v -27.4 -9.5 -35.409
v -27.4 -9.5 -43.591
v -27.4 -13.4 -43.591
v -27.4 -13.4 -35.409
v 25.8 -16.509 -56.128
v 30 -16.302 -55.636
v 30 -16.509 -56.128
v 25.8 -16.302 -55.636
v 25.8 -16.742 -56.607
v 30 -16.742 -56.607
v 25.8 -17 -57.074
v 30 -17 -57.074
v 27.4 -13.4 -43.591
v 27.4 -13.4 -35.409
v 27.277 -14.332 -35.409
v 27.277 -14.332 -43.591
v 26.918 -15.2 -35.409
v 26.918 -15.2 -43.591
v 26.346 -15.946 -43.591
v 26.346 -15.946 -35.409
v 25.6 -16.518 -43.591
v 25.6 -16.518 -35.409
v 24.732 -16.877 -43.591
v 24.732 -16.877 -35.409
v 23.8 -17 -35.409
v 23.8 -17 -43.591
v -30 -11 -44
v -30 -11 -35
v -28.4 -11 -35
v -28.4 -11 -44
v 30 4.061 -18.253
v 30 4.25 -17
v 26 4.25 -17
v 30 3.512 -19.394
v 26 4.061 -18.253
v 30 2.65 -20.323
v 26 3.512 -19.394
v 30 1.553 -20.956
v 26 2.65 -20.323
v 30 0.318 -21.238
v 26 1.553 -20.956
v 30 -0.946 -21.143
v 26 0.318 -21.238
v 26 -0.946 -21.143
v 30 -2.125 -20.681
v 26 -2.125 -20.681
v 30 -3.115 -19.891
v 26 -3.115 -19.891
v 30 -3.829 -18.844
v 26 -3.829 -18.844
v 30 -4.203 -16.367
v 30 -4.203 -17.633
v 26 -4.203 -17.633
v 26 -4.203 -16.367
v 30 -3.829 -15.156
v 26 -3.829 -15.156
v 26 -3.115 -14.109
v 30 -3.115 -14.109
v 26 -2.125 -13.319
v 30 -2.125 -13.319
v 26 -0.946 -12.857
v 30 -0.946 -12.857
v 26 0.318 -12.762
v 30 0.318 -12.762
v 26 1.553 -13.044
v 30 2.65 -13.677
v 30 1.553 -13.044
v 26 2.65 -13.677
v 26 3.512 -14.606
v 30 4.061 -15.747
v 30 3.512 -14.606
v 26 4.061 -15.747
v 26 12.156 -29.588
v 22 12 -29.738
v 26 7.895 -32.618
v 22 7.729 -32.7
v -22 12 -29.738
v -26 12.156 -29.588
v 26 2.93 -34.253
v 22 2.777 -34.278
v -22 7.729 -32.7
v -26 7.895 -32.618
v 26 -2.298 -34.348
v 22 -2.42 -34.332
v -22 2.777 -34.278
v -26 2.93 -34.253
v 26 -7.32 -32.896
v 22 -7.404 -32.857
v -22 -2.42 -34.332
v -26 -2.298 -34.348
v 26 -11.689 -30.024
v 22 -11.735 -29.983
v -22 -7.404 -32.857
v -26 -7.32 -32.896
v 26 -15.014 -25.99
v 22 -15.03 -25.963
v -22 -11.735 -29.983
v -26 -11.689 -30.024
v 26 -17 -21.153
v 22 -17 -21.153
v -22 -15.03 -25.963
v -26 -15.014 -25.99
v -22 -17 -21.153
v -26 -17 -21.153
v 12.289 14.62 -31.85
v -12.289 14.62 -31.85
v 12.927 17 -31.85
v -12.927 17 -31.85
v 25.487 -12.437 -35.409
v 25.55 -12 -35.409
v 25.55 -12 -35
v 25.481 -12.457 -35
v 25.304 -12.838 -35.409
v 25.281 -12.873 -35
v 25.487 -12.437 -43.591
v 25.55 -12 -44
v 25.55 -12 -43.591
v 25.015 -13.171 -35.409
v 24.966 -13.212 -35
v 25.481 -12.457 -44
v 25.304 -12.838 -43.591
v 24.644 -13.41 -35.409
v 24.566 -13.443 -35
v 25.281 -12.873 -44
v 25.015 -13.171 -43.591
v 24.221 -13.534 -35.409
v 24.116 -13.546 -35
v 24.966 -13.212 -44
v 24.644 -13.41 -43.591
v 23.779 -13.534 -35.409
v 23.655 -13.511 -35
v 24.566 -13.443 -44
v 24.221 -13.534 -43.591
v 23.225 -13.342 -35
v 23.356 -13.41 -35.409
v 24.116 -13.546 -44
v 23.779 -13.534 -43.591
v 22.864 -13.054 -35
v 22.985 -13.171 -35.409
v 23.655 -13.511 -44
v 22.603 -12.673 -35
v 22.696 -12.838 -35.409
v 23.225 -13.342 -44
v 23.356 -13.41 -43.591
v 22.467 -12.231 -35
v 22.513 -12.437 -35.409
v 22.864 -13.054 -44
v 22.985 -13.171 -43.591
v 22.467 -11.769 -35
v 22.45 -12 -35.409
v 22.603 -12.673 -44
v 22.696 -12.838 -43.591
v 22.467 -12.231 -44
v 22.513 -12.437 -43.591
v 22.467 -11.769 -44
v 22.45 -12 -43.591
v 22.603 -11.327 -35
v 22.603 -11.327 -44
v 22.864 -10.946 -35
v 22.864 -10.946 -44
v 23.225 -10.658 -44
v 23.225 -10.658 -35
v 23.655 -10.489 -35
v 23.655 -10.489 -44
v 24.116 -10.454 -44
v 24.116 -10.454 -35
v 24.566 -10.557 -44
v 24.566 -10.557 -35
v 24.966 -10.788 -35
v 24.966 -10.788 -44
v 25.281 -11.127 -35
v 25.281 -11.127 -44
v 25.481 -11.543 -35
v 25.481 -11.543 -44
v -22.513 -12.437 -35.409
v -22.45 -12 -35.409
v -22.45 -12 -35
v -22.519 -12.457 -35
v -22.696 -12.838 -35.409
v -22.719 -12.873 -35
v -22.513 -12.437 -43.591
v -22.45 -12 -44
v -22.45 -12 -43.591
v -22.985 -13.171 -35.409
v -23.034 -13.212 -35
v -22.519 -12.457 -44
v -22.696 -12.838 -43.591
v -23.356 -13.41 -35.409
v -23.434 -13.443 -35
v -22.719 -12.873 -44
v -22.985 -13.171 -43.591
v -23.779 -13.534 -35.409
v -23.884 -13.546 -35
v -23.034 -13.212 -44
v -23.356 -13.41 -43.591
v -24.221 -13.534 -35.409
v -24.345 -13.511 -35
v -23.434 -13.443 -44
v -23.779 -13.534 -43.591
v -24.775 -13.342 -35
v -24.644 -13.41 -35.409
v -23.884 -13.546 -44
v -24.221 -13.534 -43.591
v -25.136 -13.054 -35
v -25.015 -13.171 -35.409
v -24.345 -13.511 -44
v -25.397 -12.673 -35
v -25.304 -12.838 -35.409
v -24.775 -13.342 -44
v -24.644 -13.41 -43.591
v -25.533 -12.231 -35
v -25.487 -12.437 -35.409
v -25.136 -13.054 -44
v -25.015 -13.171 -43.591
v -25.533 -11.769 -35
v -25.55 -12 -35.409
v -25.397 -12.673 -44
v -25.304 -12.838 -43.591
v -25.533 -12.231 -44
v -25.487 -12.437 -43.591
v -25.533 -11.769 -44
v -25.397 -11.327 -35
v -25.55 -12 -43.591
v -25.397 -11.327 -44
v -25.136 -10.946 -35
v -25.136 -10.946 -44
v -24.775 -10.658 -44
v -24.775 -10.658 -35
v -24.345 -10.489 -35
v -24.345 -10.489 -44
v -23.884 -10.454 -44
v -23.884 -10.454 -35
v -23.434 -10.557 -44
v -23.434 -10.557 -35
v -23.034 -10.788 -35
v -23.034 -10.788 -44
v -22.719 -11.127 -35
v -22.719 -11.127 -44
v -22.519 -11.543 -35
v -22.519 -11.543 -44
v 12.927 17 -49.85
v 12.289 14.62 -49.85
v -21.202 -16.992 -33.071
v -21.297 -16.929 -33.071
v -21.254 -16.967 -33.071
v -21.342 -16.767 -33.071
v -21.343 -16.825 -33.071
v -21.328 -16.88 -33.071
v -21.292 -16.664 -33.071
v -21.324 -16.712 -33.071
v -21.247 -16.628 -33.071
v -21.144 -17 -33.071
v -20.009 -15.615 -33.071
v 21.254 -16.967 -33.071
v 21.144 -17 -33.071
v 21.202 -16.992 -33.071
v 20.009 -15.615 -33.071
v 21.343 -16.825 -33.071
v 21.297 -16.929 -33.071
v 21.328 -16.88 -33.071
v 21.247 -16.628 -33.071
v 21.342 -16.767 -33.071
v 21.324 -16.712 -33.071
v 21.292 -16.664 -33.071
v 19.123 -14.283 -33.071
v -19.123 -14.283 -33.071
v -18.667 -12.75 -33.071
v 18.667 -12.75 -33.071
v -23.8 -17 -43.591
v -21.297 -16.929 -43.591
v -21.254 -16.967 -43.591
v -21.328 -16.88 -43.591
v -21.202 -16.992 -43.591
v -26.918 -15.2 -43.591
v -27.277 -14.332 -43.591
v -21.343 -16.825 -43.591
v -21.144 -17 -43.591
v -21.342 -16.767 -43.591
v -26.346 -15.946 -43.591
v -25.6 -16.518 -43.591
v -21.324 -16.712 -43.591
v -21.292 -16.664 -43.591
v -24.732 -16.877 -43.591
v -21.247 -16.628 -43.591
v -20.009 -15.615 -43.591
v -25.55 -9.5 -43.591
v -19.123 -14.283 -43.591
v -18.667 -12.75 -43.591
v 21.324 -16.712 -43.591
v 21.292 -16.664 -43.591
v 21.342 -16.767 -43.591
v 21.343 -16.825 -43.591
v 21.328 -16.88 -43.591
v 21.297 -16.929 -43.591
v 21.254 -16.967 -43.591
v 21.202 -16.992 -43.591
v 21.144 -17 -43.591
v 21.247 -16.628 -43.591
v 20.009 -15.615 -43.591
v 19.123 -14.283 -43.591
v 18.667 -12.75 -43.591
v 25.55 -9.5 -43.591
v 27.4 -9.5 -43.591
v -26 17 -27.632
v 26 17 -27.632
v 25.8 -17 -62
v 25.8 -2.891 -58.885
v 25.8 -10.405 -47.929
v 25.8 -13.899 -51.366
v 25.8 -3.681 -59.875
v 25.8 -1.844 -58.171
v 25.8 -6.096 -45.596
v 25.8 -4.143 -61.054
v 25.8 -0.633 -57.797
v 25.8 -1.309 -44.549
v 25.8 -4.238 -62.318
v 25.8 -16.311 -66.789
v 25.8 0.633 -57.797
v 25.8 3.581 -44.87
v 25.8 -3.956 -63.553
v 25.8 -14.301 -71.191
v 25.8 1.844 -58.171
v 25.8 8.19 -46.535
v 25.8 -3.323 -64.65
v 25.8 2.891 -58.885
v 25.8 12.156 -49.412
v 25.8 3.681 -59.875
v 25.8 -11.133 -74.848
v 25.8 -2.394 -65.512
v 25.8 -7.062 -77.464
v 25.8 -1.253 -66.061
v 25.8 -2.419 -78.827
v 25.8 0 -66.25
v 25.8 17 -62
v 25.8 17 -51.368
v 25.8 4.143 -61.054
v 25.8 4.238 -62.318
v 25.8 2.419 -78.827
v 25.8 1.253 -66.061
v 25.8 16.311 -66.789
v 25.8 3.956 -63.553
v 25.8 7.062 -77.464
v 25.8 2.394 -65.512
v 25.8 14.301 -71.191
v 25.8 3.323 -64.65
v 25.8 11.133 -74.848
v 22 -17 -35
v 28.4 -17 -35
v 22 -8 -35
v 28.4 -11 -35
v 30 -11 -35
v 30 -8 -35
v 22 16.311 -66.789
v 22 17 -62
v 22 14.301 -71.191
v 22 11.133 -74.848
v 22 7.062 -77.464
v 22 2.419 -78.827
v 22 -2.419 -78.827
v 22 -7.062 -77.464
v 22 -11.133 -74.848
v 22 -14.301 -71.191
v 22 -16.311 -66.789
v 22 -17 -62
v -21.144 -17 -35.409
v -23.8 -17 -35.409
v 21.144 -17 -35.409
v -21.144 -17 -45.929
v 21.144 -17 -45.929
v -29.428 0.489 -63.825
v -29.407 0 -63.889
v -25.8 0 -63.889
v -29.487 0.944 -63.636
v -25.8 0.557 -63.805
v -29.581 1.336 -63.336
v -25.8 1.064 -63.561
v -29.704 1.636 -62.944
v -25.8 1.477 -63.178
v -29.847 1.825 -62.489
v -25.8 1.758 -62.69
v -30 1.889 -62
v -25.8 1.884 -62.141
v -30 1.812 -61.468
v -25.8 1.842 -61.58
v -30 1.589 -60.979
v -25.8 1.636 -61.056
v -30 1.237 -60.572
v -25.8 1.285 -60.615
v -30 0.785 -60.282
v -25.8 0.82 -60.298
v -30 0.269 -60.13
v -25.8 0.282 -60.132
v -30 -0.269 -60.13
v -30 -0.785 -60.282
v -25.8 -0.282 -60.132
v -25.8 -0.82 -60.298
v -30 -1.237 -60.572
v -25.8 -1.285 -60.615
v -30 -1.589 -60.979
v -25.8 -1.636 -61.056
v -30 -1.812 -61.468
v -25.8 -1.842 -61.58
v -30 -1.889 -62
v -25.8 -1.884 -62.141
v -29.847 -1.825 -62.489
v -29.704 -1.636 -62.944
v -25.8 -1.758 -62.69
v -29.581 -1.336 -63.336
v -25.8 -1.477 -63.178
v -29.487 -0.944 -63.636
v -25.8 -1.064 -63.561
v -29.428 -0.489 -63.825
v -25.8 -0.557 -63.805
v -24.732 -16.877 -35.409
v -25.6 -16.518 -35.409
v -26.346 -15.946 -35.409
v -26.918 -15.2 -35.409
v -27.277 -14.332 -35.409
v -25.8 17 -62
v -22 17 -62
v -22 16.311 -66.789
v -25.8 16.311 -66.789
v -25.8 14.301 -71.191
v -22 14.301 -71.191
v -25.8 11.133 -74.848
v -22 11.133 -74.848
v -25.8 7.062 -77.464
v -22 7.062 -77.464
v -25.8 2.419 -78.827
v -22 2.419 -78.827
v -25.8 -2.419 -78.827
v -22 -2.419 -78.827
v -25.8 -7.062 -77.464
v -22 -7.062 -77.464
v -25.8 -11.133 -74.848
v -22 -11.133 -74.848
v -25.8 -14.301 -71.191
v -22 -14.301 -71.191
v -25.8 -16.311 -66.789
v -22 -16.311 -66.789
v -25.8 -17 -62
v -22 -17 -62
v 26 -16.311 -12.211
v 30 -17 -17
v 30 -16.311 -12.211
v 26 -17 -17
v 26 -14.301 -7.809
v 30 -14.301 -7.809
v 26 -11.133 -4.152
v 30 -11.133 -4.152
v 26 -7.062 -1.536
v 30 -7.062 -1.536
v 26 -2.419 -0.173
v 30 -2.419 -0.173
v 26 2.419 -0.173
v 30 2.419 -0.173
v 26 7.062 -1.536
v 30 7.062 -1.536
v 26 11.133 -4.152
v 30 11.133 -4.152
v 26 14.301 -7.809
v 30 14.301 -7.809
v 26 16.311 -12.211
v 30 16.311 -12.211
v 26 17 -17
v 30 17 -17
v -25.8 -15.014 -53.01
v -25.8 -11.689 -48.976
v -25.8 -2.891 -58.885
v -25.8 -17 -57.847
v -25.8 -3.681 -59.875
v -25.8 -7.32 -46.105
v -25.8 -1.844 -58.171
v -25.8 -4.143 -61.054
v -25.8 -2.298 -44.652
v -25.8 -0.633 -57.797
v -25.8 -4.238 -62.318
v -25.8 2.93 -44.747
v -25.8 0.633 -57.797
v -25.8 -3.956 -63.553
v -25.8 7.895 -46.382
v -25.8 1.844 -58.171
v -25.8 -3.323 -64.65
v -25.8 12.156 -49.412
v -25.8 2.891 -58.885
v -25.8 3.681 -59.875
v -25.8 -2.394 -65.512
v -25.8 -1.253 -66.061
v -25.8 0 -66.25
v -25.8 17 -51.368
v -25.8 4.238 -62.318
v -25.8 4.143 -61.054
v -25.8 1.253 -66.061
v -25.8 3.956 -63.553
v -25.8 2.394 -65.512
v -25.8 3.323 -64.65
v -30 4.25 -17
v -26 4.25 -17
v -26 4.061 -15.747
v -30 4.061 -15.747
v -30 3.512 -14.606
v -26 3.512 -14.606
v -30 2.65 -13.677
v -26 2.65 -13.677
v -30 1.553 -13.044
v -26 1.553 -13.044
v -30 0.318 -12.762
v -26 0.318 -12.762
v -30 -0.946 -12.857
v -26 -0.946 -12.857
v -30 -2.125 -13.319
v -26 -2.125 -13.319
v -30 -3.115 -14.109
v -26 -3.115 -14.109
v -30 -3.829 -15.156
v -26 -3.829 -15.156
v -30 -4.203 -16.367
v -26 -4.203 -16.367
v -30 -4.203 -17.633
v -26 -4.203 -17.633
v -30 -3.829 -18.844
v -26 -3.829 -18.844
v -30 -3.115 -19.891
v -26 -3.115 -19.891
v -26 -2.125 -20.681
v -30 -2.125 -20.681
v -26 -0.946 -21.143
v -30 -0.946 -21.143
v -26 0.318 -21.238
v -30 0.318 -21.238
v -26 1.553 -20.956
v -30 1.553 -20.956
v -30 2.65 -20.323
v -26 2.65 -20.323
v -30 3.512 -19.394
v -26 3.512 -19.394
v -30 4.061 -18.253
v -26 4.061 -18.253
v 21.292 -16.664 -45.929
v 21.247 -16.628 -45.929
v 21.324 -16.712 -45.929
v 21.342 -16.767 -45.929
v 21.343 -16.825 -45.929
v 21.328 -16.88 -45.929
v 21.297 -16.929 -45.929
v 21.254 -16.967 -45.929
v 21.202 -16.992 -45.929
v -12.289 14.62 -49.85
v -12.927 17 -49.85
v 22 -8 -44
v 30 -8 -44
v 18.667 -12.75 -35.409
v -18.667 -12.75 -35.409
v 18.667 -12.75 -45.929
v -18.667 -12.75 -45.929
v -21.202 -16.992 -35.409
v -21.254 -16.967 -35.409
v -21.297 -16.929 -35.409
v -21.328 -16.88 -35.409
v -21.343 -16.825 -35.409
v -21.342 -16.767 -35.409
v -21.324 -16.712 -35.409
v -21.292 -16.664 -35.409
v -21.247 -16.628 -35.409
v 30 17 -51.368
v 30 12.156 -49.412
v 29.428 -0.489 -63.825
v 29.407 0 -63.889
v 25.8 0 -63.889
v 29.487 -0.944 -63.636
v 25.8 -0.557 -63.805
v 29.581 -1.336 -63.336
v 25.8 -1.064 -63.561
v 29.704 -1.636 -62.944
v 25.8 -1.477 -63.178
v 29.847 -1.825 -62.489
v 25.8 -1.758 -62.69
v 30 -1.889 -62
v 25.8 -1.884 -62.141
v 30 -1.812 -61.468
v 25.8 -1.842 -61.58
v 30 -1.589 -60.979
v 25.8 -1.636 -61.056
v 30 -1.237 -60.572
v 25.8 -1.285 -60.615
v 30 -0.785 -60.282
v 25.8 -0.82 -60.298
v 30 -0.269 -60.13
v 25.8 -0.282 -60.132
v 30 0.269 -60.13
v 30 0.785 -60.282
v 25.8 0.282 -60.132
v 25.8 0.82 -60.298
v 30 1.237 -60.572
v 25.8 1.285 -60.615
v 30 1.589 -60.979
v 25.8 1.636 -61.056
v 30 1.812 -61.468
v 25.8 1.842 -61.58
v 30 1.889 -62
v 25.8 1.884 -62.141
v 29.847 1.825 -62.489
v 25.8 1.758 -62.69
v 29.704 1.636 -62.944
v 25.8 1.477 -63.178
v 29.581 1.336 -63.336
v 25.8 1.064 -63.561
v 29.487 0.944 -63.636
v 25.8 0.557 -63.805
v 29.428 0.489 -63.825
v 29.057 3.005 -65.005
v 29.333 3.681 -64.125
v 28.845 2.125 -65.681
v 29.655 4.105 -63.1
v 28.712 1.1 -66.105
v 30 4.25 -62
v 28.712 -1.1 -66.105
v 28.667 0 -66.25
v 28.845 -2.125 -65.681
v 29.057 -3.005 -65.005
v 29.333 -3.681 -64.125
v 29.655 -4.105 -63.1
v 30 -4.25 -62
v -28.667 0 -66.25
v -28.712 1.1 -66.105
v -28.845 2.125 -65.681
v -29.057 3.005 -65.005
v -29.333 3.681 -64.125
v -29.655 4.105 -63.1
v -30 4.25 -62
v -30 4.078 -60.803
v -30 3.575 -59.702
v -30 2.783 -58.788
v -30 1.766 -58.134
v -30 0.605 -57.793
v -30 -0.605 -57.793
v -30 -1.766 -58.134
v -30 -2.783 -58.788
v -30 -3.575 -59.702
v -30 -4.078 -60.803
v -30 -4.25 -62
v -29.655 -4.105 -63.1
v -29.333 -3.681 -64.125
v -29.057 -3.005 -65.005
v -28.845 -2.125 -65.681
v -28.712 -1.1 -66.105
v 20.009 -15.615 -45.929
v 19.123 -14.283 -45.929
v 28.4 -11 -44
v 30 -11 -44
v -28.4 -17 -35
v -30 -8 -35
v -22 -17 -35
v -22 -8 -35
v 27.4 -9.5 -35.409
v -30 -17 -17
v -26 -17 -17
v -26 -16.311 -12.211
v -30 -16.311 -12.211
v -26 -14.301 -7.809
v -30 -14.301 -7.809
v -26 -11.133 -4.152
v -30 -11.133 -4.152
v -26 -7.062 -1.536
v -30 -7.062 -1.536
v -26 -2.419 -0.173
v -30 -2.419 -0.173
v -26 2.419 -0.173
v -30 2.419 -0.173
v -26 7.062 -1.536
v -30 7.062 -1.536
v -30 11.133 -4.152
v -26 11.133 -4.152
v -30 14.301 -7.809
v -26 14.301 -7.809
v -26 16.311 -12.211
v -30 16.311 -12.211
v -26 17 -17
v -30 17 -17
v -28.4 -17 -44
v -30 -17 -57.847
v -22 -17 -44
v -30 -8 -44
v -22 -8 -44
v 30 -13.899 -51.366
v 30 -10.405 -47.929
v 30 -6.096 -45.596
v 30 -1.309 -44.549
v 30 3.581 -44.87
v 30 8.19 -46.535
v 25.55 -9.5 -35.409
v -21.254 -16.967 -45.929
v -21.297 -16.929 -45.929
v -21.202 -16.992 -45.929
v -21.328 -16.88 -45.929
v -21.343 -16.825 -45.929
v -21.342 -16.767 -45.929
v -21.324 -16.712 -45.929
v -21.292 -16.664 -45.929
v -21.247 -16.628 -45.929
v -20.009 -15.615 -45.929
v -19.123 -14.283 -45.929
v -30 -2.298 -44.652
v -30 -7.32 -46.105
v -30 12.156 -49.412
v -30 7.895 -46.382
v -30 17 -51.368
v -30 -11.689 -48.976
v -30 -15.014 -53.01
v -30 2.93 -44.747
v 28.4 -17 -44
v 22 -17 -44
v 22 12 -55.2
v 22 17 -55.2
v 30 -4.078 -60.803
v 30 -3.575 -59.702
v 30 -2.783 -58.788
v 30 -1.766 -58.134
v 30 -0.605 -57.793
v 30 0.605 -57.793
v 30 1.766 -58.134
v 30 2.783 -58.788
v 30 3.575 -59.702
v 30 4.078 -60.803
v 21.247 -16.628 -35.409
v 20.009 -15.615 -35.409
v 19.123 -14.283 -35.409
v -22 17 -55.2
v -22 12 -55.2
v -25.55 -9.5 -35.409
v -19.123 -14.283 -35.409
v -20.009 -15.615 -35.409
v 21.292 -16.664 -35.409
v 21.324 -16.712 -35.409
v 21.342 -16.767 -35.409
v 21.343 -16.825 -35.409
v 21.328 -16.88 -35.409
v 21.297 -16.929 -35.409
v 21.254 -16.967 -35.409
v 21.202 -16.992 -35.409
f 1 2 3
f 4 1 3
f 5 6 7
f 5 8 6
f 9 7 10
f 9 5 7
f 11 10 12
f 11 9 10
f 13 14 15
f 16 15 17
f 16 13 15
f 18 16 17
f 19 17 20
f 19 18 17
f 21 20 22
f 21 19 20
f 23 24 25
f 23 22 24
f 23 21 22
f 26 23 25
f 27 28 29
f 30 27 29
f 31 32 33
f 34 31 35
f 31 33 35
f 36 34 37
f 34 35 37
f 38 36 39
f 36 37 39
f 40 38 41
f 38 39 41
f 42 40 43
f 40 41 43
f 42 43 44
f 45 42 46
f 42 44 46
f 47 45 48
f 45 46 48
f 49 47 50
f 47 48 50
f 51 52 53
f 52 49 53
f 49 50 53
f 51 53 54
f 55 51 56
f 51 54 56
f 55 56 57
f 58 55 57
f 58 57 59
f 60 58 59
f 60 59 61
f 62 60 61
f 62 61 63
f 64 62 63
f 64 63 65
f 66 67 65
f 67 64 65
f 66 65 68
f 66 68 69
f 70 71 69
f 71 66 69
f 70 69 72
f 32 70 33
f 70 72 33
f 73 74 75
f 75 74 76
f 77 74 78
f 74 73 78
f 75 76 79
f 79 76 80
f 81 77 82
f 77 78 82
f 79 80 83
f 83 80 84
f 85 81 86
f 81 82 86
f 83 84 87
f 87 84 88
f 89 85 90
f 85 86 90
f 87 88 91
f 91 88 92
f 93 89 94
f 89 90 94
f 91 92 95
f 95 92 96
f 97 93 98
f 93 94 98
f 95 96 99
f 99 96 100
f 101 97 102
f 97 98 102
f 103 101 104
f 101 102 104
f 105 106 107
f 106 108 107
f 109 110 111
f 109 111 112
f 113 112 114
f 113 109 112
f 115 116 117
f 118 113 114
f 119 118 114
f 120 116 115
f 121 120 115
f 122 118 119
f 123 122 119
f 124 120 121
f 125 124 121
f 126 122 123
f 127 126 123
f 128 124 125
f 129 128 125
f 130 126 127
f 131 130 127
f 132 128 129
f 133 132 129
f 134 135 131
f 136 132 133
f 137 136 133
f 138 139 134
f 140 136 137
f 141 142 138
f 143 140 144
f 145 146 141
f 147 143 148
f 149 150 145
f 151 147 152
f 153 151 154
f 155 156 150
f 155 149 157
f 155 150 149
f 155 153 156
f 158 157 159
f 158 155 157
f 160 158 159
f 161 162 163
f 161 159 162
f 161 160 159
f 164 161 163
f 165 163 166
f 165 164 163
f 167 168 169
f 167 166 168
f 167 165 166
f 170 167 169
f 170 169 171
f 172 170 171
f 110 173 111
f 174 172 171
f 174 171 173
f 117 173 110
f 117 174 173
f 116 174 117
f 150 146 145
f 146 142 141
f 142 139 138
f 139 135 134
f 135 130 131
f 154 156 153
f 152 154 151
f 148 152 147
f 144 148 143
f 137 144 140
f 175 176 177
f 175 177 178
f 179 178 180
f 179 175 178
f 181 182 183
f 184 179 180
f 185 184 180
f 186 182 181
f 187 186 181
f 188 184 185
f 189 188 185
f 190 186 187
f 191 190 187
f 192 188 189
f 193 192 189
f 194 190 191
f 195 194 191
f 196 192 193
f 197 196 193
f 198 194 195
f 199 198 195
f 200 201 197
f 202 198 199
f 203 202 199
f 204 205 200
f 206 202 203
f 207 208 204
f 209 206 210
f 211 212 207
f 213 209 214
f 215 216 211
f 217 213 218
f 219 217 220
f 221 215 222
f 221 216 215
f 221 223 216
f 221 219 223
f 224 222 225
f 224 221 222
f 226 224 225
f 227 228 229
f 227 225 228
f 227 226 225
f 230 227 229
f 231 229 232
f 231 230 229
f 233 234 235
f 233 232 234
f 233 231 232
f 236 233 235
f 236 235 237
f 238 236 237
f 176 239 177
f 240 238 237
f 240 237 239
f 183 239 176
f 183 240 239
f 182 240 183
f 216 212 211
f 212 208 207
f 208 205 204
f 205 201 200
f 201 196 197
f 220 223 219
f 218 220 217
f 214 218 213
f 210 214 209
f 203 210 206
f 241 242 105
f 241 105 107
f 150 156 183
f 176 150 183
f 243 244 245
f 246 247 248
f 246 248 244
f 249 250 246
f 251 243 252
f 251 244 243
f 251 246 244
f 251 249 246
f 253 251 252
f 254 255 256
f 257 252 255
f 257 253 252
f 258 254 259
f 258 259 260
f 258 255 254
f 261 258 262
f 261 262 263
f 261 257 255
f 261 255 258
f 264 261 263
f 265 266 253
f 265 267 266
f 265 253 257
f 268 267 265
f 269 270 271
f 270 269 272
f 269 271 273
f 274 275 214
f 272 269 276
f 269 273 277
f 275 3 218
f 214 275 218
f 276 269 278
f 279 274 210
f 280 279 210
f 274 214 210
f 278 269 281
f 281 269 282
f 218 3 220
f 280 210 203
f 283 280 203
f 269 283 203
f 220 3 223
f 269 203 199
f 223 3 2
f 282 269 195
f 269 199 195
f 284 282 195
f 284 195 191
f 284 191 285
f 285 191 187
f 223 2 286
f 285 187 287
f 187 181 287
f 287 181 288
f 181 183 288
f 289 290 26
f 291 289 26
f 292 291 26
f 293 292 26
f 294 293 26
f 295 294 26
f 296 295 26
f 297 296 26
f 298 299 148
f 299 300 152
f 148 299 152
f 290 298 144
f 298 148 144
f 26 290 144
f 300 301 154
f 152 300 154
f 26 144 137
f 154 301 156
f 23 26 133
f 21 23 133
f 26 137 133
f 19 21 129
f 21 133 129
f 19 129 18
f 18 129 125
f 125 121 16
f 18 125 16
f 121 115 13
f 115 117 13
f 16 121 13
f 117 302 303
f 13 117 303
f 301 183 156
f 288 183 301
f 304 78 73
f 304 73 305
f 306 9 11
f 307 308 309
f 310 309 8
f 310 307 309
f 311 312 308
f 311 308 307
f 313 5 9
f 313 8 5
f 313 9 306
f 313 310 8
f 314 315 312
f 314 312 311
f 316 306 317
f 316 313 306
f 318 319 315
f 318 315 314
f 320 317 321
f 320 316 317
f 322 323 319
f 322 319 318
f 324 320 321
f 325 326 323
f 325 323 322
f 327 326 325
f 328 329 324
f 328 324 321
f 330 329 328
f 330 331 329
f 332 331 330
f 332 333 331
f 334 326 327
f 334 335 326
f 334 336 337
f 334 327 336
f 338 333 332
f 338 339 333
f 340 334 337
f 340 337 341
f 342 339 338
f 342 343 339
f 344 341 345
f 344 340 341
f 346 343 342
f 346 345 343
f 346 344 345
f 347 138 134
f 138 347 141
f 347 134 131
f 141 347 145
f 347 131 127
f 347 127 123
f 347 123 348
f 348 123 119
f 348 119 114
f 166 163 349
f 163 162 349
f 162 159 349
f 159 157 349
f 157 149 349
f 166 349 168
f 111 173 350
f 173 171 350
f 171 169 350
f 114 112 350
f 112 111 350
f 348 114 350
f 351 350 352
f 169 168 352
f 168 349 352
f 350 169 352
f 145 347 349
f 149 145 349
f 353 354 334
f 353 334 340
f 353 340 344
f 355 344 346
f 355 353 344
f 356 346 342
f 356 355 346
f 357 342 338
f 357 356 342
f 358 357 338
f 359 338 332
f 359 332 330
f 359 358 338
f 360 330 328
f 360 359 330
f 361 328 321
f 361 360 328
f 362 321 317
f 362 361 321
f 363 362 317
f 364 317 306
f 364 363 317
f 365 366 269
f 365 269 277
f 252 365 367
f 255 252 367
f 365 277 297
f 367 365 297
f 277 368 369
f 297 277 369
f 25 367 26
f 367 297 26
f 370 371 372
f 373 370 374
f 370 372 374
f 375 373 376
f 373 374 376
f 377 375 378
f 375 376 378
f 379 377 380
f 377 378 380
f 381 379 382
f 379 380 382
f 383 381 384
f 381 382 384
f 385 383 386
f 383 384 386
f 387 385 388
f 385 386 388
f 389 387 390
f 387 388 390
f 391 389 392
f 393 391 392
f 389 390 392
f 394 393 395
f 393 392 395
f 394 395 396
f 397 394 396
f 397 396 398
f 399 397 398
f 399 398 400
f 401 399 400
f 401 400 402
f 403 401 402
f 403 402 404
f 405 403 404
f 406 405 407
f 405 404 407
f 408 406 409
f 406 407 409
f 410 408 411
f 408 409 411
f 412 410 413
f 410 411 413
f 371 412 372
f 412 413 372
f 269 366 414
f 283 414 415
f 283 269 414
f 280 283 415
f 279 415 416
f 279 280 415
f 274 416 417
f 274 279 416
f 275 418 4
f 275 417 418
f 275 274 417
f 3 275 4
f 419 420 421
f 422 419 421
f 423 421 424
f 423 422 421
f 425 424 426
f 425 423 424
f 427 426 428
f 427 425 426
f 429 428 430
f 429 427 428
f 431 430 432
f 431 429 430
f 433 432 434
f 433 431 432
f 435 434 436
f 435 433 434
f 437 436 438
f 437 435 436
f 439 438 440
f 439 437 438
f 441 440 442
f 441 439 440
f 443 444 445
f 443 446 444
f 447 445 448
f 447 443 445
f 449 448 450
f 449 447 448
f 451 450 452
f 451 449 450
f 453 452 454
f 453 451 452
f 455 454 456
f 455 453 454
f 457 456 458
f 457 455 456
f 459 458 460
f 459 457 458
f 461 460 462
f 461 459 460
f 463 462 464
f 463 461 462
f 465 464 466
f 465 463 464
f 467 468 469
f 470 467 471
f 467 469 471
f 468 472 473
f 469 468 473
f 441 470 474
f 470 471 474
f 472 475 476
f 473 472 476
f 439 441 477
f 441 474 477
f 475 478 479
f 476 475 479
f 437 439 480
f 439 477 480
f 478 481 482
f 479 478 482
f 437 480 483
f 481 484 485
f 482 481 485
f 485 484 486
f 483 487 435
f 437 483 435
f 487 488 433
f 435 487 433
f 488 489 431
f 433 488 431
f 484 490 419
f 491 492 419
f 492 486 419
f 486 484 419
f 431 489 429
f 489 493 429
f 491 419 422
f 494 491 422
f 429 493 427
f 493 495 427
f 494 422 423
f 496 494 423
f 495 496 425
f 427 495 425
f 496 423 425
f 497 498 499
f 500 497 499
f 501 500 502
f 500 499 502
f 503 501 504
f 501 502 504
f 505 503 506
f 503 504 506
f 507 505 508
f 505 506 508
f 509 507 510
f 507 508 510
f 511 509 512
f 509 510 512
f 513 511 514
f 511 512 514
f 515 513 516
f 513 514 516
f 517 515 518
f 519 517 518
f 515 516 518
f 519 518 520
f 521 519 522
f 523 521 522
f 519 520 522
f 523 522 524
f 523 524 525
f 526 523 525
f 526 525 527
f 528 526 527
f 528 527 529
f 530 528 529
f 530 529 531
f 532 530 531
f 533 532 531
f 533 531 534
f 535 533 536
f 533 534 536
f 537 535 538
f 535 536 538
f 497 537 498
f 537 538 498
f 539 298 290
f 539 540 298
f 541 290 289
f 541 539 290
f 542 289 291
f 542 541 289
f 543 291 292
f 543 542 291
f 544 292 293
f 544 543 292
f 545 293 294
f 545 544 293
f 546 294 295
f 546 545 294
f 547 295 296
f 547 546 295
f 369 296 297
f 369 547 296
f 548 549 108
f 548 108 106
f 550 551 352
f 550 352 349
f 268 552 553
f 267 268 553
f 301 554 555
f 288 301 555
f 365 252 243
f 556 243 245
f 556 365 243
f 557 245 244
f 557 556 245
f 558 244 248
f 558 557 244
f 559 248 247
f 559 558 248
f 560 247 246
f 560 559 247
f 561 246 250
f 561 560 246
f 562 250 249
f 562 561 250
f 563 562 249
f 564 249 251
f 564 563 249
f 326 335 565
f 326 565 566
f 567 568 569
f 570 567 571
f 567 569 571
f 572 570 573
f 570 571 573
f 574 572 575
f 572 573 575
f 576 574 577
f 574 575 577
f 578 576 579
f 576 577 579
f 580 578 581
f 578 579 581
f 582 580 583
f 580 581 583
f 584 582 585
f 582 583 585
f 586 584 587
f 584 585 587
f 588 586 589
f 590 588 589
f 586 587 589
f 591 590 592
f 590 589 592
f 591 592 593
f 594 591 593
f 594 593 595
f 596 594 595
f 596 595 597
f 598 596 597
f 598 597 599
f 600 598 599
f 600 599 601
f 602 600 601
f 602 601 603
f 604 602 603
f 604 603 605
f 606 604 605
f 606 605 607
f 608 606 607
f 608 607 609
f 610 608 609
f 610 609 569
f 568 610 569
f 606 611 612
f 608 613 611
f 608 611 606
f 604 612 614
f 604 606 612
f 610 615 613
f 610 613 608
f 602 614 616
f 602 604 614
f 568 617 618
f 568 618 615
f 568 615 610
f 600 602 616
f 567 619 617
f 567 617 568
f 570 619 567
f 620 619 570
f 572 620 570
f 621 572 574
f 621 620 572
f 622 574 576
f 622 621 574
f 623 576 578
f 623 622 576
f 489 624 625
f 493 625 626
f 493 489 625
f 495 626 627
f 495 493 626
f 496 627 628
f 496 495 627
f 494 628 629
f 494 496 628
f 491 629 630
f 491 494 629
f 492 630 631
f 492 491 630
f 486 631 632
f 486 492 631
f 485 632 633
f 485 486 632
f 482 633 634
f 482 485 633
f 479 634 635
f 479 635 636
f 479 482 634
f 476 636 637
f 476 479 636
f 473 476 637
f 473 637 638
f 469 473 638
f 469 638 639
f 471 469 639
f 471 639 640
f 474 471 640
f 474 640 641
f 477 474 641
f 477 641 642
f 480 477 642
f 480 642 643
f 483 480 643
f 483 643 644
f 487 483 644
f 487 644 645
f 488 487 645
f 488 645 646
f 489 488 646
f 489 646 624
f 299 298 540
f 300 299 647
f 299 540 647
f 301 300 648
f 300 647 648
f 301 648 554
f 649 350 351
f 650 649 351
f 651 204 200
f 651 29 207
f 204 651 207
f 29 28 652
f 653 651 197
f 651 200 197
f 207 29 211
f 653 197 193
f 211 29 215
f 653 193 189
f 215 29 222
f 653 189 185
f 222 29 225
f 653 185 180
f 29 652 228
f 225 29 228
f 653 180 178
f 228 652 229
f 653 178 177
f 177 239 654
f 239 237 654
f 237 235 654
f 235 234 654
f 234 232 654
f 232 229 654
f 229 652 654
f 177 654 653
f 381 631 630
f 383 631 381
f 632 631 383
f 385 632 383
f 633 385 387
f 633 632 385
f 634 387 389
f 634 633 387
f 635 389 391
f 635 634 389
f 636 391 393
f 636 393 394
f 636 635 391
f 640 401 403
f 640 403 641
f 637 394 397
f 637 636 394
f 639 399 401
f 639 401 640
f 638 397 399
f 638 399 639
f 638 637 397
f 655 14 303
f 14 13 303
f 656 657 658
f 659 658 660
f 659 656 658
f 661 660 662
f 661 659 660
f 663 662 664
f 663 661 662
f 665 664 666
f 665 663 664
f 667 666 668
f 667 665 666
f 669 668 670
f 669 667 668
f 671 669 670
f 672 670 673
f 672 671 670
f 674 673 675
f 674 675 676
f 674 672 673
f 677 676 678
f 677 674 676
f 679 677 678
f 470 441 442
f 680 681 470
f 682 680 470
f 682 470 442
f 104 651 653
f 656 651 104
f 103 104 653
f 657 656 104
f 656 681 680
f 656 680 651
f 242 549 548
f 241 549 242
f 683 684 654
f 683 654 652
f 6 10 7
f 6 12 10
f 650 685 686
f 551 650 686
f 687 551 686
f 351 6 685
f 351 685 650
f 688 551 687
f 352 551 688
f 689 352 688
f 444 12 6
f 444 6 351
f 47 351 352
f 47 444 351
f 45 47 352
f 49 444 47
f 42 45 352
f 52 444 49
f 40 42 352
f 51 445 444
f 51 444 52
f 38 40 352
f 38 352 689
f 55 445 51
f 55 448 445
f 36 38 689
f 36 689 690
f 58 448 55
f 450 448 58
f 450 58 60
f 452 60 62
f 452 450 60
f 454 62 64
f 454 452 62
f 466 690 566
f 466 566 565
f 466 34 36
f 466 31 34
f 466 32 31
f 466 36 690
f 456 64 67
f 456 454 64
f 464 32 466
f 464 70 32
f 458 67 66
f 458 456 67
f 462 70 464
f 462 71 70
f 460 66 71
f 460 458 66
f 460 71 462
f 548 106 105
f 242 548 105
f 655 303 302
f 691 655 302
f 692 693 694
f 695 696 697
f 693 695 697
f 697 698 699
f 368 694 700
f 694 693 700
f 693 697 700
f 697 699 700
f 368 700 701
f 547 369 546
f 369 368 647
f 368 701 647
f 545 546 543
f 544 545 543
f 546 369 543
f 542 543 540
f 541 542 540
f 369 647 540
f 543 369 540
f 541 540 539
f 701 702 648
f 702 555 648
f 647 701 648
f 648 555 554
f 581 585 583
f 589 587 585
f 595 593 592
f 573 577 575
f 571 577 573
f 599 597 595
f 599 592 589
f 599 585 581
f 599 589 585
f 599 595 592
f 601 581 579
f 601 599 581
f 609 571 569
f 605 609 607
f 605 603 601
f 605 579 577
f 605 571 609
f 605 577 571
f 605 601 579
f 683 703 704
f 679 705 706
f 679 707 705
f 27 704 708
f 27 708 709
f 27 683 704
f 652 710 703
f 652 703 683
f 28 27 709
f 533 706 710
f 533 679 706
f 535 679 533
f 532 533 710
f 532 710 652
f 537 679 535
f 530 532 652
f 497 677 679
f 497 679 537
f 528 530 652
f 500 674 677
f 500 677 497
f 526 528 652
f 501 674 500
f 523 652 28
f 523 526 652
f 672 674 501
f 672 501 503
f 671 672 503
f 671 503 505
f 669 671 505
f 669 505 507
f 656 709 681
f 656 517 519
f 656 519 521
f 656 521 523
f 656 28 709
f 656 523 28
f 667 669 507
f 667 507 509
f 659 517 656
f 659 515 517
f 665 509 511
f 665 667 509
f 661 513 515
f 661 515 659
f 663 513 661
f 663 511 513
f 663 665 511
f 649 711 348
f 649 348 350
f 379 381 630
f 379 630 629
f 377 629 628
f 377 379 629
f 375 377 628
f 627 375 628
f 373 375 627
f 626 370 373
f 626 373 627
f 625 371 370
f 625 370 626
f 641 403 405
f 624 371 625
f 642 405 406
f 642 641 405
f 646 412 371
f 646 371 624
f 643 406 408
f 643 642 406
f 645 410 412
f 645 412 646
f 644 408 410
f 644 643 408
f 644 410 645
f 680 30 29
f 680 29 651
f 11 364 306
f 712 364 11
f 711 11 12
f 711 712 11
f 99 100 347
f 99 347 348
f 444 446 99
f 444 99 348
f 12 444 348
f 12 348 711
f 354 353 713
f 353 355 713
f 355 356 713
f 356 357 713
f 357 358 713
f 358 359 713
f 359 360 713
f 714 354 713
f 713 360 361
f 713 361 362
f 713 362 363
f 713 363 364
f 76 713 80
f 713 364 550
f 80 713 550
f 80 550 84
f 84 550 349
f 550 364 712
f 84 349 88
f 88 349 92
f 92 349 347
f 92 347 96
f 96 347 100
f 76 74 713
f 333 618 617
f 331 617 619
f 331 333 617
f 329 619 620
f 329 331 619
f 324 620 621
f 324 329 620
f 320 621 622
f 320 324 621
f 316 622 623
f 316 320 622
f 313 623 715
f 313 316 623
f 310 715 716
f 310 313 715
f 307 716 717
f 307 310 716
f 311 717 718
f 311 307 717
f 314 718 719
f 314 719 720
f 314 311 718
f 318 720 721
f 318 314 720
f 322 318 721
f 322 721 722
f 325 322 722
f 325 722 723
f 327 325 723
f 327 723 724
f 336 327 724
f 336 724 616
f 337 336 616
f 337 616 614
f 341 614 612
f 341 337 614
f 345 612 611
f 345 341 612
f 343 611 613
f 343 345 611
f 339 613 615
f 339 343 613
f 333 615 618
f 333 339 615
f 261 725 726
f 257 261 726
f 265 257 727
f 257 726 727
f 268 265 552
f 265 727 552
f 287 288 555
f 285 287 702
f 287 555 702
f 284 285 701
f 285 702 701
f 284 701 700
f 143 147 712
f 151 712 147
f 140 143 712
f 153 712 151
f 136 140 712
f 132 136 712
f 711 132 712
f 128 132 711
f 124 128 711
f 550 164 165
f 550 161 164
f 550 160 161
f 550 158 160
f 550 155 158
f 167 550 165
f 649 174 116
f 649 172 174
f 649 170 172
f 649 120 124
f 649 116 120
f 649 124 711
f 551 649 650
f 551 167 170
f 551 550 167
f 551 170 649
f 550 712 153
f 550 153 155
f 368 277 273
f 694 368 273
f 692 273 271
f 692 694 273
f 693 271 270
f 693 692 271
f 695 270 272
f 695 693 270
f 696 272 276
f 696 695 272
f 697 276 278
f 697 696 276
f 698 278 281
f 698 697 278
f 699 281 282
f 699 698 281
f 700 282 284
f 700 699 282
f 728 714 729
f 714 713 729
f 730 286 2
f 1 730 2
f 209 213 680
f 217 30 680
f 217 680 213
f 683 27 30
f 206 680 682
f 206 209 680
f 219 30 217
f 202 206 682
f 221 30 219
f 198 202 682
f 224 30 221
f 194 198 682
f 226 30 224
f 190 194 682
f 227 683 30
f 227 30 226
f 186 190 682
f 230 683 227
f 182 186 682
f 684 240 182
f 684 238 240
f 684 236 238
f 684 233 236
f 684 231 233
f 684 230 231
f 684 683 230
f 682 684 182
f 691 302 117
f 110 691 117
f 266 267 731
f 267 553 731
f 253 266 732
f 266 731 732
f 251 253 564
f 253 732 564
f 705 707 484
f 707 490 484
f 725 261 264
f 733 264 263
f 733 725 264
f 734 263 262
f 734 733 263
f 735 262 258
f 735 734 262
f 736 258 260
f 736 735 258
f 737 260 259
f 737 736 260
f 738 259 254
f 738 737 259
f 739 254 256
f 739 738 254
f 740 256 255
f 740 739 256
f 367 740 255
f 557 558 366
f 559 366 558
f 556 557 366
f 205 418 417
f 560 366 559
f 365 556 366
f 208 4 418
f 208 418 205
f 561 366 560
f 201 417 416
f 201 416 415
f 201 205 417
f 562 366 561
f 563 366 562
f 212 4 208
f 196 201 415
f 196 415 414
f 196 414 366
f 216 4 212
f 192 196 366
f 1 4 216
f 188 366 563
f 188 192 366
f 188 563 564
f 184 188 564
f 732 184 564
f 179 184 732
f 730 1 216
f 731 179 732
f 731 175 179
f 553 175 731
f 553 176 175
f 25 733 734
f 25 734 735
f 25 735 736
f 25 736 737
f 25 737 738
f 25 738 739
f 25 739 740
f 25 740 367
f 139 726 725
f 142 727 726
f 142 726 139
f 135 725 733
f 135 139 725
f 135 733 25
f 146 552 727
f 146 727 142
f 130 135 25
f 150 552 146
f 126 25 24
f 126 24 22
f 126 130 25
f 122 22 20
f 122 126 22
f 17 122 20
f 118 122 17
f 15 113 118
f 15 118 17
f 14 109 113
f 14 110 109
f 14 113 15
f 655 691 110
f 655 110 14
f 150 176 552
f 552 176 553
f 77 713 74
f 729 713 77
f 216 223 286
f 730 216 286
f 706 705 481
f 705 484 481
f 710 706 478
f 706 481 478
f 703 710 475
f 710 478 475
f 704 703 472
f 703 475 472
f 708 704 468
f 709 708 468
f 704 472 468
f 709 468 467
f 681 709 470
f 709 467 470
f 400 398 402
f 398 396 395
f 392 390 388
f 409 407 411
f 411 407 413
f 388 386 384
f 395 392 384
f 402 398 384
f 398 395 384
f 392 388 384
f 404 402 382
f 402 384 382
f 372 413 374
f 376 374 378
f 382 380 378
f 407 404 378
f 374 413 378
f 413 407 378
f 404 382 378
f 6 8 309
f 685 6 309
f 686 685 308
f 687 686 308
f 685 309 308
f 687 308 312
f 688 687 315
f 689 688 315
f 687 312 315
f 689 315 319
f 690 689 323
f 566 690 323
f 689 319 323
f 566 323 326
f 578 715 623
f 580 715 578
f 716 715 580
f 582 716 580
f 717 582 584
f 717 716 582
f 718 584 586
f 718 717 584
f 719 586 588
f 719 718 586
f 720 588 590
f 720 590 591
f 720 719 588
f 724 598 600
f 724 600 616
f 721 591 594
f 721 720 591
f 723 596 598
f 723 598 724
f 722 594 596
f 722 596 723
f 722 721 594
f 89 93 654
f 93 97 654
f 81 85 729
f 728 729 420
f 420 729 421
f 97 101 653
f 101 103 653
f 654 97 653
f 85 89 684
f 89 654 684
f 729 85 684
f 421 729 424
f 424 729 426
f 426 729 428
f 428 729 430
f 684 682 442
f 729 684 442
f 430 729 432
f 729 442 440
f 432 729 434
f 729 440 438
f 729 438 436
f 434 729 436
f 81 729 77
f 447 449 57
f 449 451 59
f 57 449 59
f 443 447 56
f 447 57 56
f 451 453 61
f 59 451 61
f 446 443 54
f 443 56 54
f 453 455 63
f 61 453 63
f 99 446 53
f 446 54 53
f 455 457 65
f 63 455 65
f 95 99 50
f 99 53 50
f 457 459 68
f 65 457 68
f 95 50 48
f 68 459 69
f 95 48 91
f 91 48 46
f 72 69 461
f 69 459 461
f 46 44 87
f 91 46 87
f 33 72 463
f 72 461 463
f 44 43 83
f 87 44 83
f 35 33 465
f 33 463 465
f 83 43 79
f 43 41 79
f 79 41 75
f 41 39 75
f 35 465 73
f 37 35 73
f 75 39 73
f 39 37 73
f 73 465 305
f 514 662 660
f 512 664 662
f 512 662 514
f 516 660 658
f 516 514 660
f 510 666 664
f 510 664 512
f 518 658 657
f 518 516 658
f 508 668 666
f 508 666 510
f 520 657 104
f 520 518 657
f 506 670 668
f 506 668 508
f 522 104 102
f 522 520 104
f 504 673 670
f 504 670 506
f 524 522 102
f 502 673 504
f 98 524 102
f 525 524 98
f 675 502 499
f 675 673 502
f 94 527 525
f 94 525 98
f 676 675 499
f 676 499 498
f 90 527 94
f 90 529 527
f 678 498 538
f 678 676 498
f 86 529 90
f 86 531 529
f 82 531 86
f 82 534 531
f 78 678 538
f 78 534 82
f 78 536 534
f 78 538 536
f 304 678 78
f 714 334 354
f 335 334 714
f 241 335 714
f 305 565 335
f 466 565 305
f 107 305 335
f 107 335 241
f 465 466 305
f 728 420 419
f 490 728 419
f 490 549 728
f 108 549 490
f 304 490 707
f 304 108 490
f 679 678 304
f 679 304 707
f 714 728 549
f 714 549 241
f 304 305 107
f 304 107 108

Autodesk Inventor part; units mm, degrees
sketch "Sketch_1" plane through (0, 0, 0) normal (0, 0, 1) x (1, 0, 0)
  line L0 (-30, 17) -> (-30, -17)
  line L1 (-30, -17) -> (30, -17)
  line L2 (30, -17) -> (30, 17)
  line L3 (30, 17) -> (-30, 17)
extrude "Extrusion1" add sketch "Sketch_1" against normal blind 79
sketch "Sketch_3" plane through (0, 0, 0) normal (0, 0, 1) x (1, 0, 0)
  line L0 (-22, 12) -> (-22, -17)
  line L1 (-22, -17) -> (22, -17)
  line L2 (22, -17) -> (22, 12)
  line L3 (22, 12) -> (-22, 12)
extrude "Extrusion2" cut sketch "Sketch_3" along normal mid plane 158
sketch "Sketch_6" plane through (0, 0, -31.85) normal (0, 0, 1) x (1, 0, 0)
  line L0 (-13.2, 18.02) -> (-12.289, 14.62)
  line L1 (-12.289, 14.62) -> (12.289, 14.62)
  line L2 (12.289, 14.62) -> (13.2, 18.02)
  line L3 (13.2, 18.02) -> (-13.2, 18.02)
extrude "Extrusion3" cut sketch "Sketch_6" against normal blind 18
sketch "Sketch_4" plane through (0, 0, 0) normal (0, 1, 0) x (-1, 0, 0)
  line L0 (60, 60) -> (-60, 60)
  line L1 (-60, 60) -> (-60, -120)
  line L2 (-60, -120) -> (60, -120)
  line L3 (60, -120) -> (60, 60)
  line L4 (30, 0) -> (22, 0)
  line L5 (22, 0) -> (22, -27.2)
  line L6 (22, -27.2) -> (-22, -27.2)
  line L7 (-22, -27.2) -> (-22, 0)
  line L8 (-22, 0) -> (-30, 0)
  line L9 (-30, 0) -> (-30, -79)
  line L10 (-30, -79) -> (-22, -79)
  line L11 (-22, -79) -> (-22, -55.2)
  line L12 (-22, -55.2) -> (22, -55.2)
  line L13 (22, -55.2) -> (22, -79)
  line L14 (22, -79) -> (30, -79)
  line L15 (30, -79) -> (30, 0)
extrude "Extrusion4" cut sketch "Sketch_4" along normal mid plane 158
sketch "Sketch_2" plane through (0, 0, 0) normal (1, 0, 0) x (0, 1, 0)
  line L0 (45, 45) -> (-45, 45)
  line L1 (-45, 45) -> (-45, -90)
  line L2 (-45, -90) -> (45, -90)
  line L3 (45, -90) -> (45, 45)
  arc A0 (17, -17) -> (-17, -17) centre (0, -17) ccw
  line L4 (-17, -17) -> (-17, -62)
  arc A1 (-17, -62) -> (17, -62) centre (0, -62) ccw
  line L5 (17, -62) -> (17, -17)
extrude "Extrusion5" cut sketch "Sketch_2" along normal mid plane 60
sketch "Sketch_5" plane through (-25.8, 0, 0) normal (1, 0, 0) x (0, 0, -1)
  arc A0 (49.4116, 12.1565) -> (62, -17.5) centre (62, 0) ccw
  line L0 (62, -17.5) -> (62, -56)
  line L1 (62, -56) -> (89.4, -56)
  line L2 (89.4, -56) -> (89.4, 47)
  line L3 (89.4, 47) -> (63.4892, 47)
  line L4 (63.4892, 47) -> (49.4116, 12.1565)
  circle A1 centre (62, 0) radius 4.25
extrude "Extrusion6" cut sketch "Sketch_5" against normal blind 15
sketch "Sketch_8" plane through (-25.8, 0, 0) normal (1, 0, 0) x (0, 0, -1)
  circle A0 centre (62, 0) radius 1.8889
extrude "Extrusion7" cut sketch "Sketch_8" against normal blind 15
sketch "Sketch_11" plane through (0, 0, 0) normal (1, 0, 0) x (0, 1, 0)
  circle A0 centre (0, -17) radius 4.25
extrude "Extrusion8" cut sketch "Sketch_11" along normal mid plane 60
sketch "Sketch_24" plane through (-26, 0, 0) normal (1, 0, 0) x (0, 0, -1)
  line L0 (-3.4, -51) -> (17, -51)
  line L1 (17, -51) -> (17, -17.5)
  arc A0 (17, -17.5) -> (29.5884, 12.1565) centre (17, 0) ccw
  line L2 (29.5884, 12.1565) -> (21.5712, 32)
  line L3 (21.5712, 32) -> (-3.4, 32)
  line L4 (-3.4, 32) -> (-3.4, -51)
extrude "Extrusion9" cut sketch "Sketch_24" along normal blind 52
sketch "Sketch_7" plane through (25.8, 0, 0) normal (1, 0, 0) x (0, 0, -1)
  arc A0 (49.4116, 12.1565) -> (55.6364, -16.302) centre (62, 0) ccw
  arc A1 (62, -25.6174) -> (55.6364, -16.302) centre (52, -25.6174) ccw
  line L0 (62, -25.6174) -> (62, -56)
  line L1 (62, -56) -> (89.4, -56)
  line L2 (89.4, -56) -> (89.4, 47)
  line L3 (89.4, 47) -> (63.4892, 47)
  line L4 (63.4892, 47) -> (49.4116, 12.1565)
  circle A2 centre (62, 0) radius 4.25
extrude "Extrusion10" cut sketch "Sketch_7" along normal blind 15
sketch "Sketch_9" plane through (25.8, 0, 0) normal (1, 0, 0) x (0, 0, -1)
  circle A0 centre (62, 0) radius 1.8889
extrude "Extrusion11" cut sketch "Sketch_9" along normal blind 15
sketch "Sketch_10" plane through (0, 0, -39.5) normal (0, 0, 1) x (1, 0, 0)
  line L0 (-30, -8) -> (-30, -11)
  line L1 (-30, -11) -> (-28.4, -11)
  line L2 (-28.4, -11) -> (-28.4, -17)
  line L3 (-28.4, -17) -> (-22, -17)
  line L4 (-22, -17) -> (-22, -8)
  line L5 (-22, -8) -> (-30, -8)
  circle A0 centre (-24, -12) radius 1.55
extrude "Extrusion12" cut sketch "Sketch_10" along normal mid plane 9
sketch "Sketch_13" plane through (0, 0, -39.5) normal (0, 0, 1) x (1, 0, 0)
  line L0 (22, -8) -> (22, -17)
  line L1 (22, -17) -> (28.4, -17)
  line L2 (28.4, -17) -> (28.4, -11)
  line L3 (28.4, -11) -> (30, -11)
  line L4 (30, -11) -> (30, -8)
  line L5 (30, -8) -> (22, -8)
  circle A0 centre (24, -12) radius 1.55
extrude "Extrusion13" cut sketch "Sketch_13" along normal mid plane 9
sketch "Sketch_14" plane through (0, 0, 0) normal (0, 1, 0) x (-1, 0, 0)
  line L0 (-28.6667, -66.25) -> (-30, -62)
  line L1 (-30, -62) -> (-30, -66.25)
  line L2 (-30, -66.25) -> (-28.6667, -66.25)
extrude "Extrusion14" cut sketch "Sketch_14" along normal mid plane 8.5
sketch "Sketch_18" plane through (0, 0, 0) normal (0, 1, 0) x (-1, 0, 0)
  line L0 (30, -62) -> (28.6667, -66.25)
  line L1 (28.6667, -66.25) -> (30, -66.25)
  line L2 (30, -66.25) -> (30, -62)
extrude "Extrusion15" cut sketch "Sketch_18" along normal mid plane 8.5
sketch "Sketch_25" plane through (0, 0, -39.5) normal (0, 0, 1) x (1, 0, 0)
  line L0 (-27.4, -9.5) -> (-27.4, -13.4)
  arc A0 (-27.4, -13.4) -> (-23.8, -17) centre (-23.8, -13.4) ccw
  line L1 (-23.8, -17) -> (23.8, -17)
  arc A1 (23.8, -17) -> (27.4, -13.4) centre (23.8, -13.4) ccw
  line L2 (27.4, -13.4) -> (27.4, -9.5)
  line L3 (27.4, -9.5) -> (25.55, -9.5)
  line L4 (25.55, -9.5) -> (25.55, -12)
  arc A2 (22.45, -12) -> (25.55, -12) centre (24, -12) ccw
  line L5 (22.45, -12) -> (-22.45, -12)
  arc A3 (-25.55, -12) -> (-22.45, -12) centre (-24, -12) ccw
  line L6 (-25.55, -12) -> (-25.55, -9.5)
  line L7 (-25.55, -9.5) -> (-27.4, -9.5)
extrude "Extrusion16" add sketch "Sketch_25" along normal mid plane 8.1818
sketch "Sketch_27" plane through (0, 0, -39.5) normal (0, 0, 1) x (1, 0, 0)
  arc A0 (-21.2467, -16.6281) -> (-21.1445, -17) centre (-21.1445, -16.8) ccw
  line L0 (-21.1445, -17) -> (21.1445, -17)
  arc A1 (21.1445, -17) -> (21.2467, -16.6281) centre (21.1445, -16.8) ccw
  arc A2 (18.6673, -12.75) -> (21.2467, -16.6281) centre (24, -12) ccw
  line L1 (18.6673, -12.75) -> (-18.6673, -12.75)
  arc A3 (-21.2467, -16.6281) -> (-18.6673, -12.75) centre (-24, -12) ccw
extrude "Extrusion17" add sketch "Sketch_27" along normal mid plane 12.8571
ref_plane "clip1_to_dummy_XY" through (0, 0, -17) normal (1, 0, 0) x (0, 0, -1)
ref_plane "clip1_to_dummy_YZ" through (0, 0, -17) normal (0, 0, -1) x (0, 1, 0)
ref_plane "clip1_to_dummy_ZX" through (0, 0, -17) normal (0, 1, 0) x (1, 0, 0)
ref_plane "clip_back_to_clip_front_XY" through (0, 0, -62) normal (1, 0, 0) x (0, 0, -1)
ref_plane "clip_back_to_clip_front_YZ" through (0, 0, -62) normal (0, 0, -1) x (0, 1, 0)
ref_plane "clip_back_to_clip_front_ZX" through (0, 0, -62) normal (0, 1, 0) x (1, 0, 0)
ref_plane "clip_end_to_fitting_free_left_XY" through (-25.8, 0, -917) normal (1, 0, 0) x (0, 0, -1)
ref_plane "clip_end_to_fitting_free_left_YZ" through (-25.8, 0, -917) normal (0, 0, -1) x (0, 1, 0)
ref_plane "clip_end_to_fitting_free_left_ZX" through (-25.8, 0, -917) normal (0, 1, 0) x (1, 0, 0)
ref_plane "clip_end_to_fitting_free_right_XY" through (25.8, 0, -917) normal (1, 0, 0) x (0, 0, -1)
ref_plane "clip_end_to_fitting_free_right_YZ" through (25.8, 0, -917) normal (0, 0, -1) x (0, 1, 0)
ref_plane "clip_end_to_fitting_free_right_ZX" through (25.8, 0, -917) normal (0, 1, 0) x (1, 0, 0)
ref_plane "clip_front_to_clip_back_XY" through (0, 0, -17) normal (1, 0, 0) x (0, 0, -1)
ref_plane "clip_front_to_clip_back_YZ" through (0, 0, -17) normal (0, 0, -1) x (0, 1, 0)
ref_plane "clip_front_to_clip_back_ZX" through (0, 0, -17) normal (0, 1, 0) x (1, 0, 0)
ref_plane "clip_front_to_fitting_fixed_left_XY" through (-26, 0, -17) normal (1, 0, 0) x (0, 0, -1)
ref_plane "clip_front_to_fitting_fixed_left_YZ" through (-26, 0, -17) normal (0, 0, -1) x (0, 1, 0)
ref_plane "clip_front_to_fitting_fixed_left_ZX" through (-26, 0, -17) normal (0, 1, 0) x (1, 0, 0)
ref_plane "clip_front_to_fitting_fixed_right_XY" through (26, 0, -17) normal (1, 0, 0) x (0, 0, -1)
ref_plane "clip_front_to_fitting_fixed_right_YZ" through (26, 0, -17) normal (0, 0, -1) x (0, 1, 0)
ref_plane "clip_front_to_fitting_fixed_right_ZX" through (26, 0, -17) normal (0, 1, 0) x (1, 0, 0)
ref_plane "clip_front_to_fitting_right_XY" through (0, 0, -17) normal (1, 0, 0) x (0, 0, -1)
ref_plane "clip_front_to_fitting_right_YZ" through (0, 0, -17) normal (0, 0, -1) x (0, 1, 0)
ref_plane "clip_front_to_fitting_right_ZX" through (0, 0, -17) normal (0, 1, 0) x (1, 0, 0)
ref_plane "clip_to_flap_XY" through (-24, -12, -39.5) normal (0, 0, 1) x (1, 0, 0)
ref_plane "clip_to_flap_YZ" through (-24, -12, -39.5) normal (1, 0, 0) x (0, 1, 0)
ref_plane "clip_to_flap_ZX" through (-24, -12, -39.5) normal (0, 1, 0) x (0, 0, 1)
ref_plane "to_center_XY" through (0, 44.6514, -39.5) normal (1, 0, 0) x (0, 0, -1)
ref_plane "to_center_YZ" through (0, 44.6514, -39.5) normal (0, 0, -1) x (0, 1, 0)
ref_plane "to_center_ZX" through (0, 44.6514, -39.5) normal (0, 1, 0) x (1, 0, 0)
ref_plane "to_clip1_XY" through (0, 0, -17) normal (0, 0, 1) x (1, 0, 0)
ref_plane "to_clip1_YZ" through (0, 0, -17) normal (1, 0, 0) x (0, 1, 0)
ref_plane "to_clip1_ZX" through (0, 0, -17) normal (0, 1, 0) x (0, 0, 1)
ref_plane "to_clip5_XY" through (0, 0, -917) normal (0, 0, 1) x (1, 0, 0)
ref_plane "to_clip5_YZ" through (0, 0, -917) normal (1, 0, 0) x (0, 1, 0)
ref_plane "to_clip5_ZX" through (0, 0, -917) normal (0, 1, 0) x (0, 0, 1)
properties part number "MHPUS306-50-25-Aclip"
